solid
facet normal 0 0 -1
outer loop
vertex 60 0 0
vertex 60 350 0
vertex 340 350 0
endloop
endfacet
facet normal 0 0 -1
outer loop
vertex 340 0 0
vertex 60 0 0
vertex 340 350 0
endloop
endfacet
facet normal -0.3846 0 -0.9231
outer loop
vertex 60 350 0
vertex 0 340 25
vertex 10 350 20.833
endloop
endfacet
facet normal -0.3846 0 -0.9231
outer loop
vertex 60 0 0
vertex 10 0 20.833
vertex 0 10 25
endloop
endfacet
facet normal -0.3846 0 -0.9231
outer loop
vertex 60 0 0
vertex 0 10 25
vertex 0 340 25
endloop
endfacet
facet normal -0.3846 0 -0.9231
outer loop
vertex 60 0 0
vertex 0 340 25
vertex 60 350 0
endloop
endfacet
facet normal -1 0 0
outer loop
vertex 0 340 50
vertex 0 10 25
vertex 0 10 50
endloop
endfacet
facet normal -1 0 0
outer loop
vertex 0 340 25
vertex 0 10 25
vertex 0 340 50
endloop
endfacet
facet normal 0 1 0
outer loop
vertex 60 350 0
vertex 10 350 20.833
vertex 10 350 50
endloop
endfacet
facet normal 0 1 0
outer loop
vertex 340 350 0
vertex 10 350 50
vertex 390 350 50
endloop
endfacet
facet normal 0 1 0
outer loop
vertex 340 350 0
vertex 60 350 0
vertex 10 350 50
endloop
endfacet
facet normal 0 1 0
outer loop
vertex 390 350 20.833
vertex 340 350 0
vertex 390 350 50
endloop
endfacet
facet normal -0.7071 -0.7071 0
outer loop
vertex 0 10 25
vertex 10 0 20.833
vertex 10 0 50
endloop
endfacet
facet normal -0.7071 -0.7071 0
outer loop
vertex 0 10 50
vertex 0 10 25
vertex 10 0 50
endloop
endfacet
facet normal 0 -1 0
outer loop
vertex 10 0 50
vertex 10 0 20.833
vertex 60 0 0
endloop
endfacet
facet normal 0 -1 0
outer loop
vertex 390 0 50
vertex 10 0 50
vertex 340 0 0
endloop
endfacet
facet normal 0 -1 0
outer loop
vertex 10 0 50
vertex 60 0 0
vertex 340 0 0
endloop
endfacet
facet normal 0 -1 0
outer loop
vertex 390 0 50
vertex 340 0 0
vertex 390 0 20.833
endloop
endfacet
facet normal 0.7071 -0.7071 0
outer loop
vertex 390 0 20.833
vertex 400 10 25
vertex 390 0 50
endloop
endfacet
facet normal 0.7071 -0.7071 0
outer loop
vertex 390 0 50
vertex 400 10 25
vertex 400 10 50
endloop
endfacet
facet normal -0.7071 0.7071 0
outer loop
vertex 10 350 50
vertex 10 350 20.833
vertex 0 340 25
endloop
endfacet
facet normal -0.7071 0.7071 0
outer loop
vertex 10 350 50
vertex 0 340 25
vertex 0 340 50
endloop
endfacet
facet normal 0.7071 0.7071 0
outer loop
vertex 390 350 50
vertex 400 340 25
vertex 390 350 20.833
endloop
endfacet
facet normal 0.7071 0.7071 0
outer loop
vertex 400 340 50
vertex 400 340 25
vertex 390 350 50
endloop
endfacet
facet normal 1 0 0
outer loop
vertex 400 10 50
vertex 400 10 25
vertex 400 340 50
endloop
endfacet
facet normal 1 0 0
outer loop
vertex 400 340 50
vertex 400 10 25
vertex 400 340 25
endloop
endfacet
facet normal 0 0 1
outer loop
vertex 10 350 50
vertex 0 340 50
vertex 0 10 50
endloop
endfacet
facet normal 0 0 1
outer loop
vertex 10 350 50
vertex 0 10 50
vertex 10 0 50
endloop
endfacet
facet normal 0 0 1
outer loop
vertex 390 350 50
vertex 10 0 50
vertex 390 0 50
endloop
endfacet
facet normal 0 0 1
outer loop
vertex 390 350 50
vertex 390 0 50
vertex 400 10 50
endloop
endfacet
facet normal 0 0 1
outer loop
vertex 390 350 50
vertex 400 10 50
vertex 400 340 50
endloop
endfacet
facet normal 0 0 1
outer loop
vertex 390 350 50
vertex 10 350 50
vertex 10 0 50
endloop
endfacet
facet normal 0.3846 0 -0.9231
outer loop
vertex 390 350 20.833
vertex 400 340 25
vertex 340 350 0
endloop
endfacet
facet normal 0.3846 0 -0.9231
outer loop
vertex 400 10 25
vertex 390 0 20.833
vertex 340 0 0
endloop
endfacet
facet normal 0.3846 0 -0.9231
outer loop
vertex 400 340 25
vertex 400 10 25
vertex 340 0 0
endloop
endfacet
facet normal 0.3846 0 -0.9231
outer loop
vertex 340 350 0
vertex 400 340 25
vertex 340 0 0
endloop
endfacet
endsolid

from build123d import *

# Parameters (mm, degrees)
SKETCH_W     = 400
SKETCH_H     = 350
PAD_DEPTH    = 50
POCKET_DEPTH = 350.001
CHAMFER_SIZE = 10


with BuildPart() as part:
    # Sketch → Pad (new body)
    with BuildSketch(Plane.XY):
        with Locations((200, 175)):
            Rectangle(SKETCH_W, SKETCH_H)
    extrude(amount=PAD_DEPTH)

    # Sketch001 (on Face1 of Pad) → Pocket (cut, through all)
    with BuildSketch(Plane.XZ):
        Polygon((0, 25), (60, 0), (0, 0), align=None)
        Polygon((400, 25), (340, 0), (400, 0), align=None)
    extrude(amount=-POCKET_DEPTH, mode=Mode.SUBTRACT)

    # Chamfer
    chamfer_edges = [part.edges().sort_by_distance(p)[0] for p in [
        (400, 0, 37.5),
        (0, 0, 37.5),
        (400, 350, 37.5),
        (0, 350, 37.5),
    ]]
    chamfer(chamfer_edges, length=CHAMFER_SIZE)


solid = part.part
